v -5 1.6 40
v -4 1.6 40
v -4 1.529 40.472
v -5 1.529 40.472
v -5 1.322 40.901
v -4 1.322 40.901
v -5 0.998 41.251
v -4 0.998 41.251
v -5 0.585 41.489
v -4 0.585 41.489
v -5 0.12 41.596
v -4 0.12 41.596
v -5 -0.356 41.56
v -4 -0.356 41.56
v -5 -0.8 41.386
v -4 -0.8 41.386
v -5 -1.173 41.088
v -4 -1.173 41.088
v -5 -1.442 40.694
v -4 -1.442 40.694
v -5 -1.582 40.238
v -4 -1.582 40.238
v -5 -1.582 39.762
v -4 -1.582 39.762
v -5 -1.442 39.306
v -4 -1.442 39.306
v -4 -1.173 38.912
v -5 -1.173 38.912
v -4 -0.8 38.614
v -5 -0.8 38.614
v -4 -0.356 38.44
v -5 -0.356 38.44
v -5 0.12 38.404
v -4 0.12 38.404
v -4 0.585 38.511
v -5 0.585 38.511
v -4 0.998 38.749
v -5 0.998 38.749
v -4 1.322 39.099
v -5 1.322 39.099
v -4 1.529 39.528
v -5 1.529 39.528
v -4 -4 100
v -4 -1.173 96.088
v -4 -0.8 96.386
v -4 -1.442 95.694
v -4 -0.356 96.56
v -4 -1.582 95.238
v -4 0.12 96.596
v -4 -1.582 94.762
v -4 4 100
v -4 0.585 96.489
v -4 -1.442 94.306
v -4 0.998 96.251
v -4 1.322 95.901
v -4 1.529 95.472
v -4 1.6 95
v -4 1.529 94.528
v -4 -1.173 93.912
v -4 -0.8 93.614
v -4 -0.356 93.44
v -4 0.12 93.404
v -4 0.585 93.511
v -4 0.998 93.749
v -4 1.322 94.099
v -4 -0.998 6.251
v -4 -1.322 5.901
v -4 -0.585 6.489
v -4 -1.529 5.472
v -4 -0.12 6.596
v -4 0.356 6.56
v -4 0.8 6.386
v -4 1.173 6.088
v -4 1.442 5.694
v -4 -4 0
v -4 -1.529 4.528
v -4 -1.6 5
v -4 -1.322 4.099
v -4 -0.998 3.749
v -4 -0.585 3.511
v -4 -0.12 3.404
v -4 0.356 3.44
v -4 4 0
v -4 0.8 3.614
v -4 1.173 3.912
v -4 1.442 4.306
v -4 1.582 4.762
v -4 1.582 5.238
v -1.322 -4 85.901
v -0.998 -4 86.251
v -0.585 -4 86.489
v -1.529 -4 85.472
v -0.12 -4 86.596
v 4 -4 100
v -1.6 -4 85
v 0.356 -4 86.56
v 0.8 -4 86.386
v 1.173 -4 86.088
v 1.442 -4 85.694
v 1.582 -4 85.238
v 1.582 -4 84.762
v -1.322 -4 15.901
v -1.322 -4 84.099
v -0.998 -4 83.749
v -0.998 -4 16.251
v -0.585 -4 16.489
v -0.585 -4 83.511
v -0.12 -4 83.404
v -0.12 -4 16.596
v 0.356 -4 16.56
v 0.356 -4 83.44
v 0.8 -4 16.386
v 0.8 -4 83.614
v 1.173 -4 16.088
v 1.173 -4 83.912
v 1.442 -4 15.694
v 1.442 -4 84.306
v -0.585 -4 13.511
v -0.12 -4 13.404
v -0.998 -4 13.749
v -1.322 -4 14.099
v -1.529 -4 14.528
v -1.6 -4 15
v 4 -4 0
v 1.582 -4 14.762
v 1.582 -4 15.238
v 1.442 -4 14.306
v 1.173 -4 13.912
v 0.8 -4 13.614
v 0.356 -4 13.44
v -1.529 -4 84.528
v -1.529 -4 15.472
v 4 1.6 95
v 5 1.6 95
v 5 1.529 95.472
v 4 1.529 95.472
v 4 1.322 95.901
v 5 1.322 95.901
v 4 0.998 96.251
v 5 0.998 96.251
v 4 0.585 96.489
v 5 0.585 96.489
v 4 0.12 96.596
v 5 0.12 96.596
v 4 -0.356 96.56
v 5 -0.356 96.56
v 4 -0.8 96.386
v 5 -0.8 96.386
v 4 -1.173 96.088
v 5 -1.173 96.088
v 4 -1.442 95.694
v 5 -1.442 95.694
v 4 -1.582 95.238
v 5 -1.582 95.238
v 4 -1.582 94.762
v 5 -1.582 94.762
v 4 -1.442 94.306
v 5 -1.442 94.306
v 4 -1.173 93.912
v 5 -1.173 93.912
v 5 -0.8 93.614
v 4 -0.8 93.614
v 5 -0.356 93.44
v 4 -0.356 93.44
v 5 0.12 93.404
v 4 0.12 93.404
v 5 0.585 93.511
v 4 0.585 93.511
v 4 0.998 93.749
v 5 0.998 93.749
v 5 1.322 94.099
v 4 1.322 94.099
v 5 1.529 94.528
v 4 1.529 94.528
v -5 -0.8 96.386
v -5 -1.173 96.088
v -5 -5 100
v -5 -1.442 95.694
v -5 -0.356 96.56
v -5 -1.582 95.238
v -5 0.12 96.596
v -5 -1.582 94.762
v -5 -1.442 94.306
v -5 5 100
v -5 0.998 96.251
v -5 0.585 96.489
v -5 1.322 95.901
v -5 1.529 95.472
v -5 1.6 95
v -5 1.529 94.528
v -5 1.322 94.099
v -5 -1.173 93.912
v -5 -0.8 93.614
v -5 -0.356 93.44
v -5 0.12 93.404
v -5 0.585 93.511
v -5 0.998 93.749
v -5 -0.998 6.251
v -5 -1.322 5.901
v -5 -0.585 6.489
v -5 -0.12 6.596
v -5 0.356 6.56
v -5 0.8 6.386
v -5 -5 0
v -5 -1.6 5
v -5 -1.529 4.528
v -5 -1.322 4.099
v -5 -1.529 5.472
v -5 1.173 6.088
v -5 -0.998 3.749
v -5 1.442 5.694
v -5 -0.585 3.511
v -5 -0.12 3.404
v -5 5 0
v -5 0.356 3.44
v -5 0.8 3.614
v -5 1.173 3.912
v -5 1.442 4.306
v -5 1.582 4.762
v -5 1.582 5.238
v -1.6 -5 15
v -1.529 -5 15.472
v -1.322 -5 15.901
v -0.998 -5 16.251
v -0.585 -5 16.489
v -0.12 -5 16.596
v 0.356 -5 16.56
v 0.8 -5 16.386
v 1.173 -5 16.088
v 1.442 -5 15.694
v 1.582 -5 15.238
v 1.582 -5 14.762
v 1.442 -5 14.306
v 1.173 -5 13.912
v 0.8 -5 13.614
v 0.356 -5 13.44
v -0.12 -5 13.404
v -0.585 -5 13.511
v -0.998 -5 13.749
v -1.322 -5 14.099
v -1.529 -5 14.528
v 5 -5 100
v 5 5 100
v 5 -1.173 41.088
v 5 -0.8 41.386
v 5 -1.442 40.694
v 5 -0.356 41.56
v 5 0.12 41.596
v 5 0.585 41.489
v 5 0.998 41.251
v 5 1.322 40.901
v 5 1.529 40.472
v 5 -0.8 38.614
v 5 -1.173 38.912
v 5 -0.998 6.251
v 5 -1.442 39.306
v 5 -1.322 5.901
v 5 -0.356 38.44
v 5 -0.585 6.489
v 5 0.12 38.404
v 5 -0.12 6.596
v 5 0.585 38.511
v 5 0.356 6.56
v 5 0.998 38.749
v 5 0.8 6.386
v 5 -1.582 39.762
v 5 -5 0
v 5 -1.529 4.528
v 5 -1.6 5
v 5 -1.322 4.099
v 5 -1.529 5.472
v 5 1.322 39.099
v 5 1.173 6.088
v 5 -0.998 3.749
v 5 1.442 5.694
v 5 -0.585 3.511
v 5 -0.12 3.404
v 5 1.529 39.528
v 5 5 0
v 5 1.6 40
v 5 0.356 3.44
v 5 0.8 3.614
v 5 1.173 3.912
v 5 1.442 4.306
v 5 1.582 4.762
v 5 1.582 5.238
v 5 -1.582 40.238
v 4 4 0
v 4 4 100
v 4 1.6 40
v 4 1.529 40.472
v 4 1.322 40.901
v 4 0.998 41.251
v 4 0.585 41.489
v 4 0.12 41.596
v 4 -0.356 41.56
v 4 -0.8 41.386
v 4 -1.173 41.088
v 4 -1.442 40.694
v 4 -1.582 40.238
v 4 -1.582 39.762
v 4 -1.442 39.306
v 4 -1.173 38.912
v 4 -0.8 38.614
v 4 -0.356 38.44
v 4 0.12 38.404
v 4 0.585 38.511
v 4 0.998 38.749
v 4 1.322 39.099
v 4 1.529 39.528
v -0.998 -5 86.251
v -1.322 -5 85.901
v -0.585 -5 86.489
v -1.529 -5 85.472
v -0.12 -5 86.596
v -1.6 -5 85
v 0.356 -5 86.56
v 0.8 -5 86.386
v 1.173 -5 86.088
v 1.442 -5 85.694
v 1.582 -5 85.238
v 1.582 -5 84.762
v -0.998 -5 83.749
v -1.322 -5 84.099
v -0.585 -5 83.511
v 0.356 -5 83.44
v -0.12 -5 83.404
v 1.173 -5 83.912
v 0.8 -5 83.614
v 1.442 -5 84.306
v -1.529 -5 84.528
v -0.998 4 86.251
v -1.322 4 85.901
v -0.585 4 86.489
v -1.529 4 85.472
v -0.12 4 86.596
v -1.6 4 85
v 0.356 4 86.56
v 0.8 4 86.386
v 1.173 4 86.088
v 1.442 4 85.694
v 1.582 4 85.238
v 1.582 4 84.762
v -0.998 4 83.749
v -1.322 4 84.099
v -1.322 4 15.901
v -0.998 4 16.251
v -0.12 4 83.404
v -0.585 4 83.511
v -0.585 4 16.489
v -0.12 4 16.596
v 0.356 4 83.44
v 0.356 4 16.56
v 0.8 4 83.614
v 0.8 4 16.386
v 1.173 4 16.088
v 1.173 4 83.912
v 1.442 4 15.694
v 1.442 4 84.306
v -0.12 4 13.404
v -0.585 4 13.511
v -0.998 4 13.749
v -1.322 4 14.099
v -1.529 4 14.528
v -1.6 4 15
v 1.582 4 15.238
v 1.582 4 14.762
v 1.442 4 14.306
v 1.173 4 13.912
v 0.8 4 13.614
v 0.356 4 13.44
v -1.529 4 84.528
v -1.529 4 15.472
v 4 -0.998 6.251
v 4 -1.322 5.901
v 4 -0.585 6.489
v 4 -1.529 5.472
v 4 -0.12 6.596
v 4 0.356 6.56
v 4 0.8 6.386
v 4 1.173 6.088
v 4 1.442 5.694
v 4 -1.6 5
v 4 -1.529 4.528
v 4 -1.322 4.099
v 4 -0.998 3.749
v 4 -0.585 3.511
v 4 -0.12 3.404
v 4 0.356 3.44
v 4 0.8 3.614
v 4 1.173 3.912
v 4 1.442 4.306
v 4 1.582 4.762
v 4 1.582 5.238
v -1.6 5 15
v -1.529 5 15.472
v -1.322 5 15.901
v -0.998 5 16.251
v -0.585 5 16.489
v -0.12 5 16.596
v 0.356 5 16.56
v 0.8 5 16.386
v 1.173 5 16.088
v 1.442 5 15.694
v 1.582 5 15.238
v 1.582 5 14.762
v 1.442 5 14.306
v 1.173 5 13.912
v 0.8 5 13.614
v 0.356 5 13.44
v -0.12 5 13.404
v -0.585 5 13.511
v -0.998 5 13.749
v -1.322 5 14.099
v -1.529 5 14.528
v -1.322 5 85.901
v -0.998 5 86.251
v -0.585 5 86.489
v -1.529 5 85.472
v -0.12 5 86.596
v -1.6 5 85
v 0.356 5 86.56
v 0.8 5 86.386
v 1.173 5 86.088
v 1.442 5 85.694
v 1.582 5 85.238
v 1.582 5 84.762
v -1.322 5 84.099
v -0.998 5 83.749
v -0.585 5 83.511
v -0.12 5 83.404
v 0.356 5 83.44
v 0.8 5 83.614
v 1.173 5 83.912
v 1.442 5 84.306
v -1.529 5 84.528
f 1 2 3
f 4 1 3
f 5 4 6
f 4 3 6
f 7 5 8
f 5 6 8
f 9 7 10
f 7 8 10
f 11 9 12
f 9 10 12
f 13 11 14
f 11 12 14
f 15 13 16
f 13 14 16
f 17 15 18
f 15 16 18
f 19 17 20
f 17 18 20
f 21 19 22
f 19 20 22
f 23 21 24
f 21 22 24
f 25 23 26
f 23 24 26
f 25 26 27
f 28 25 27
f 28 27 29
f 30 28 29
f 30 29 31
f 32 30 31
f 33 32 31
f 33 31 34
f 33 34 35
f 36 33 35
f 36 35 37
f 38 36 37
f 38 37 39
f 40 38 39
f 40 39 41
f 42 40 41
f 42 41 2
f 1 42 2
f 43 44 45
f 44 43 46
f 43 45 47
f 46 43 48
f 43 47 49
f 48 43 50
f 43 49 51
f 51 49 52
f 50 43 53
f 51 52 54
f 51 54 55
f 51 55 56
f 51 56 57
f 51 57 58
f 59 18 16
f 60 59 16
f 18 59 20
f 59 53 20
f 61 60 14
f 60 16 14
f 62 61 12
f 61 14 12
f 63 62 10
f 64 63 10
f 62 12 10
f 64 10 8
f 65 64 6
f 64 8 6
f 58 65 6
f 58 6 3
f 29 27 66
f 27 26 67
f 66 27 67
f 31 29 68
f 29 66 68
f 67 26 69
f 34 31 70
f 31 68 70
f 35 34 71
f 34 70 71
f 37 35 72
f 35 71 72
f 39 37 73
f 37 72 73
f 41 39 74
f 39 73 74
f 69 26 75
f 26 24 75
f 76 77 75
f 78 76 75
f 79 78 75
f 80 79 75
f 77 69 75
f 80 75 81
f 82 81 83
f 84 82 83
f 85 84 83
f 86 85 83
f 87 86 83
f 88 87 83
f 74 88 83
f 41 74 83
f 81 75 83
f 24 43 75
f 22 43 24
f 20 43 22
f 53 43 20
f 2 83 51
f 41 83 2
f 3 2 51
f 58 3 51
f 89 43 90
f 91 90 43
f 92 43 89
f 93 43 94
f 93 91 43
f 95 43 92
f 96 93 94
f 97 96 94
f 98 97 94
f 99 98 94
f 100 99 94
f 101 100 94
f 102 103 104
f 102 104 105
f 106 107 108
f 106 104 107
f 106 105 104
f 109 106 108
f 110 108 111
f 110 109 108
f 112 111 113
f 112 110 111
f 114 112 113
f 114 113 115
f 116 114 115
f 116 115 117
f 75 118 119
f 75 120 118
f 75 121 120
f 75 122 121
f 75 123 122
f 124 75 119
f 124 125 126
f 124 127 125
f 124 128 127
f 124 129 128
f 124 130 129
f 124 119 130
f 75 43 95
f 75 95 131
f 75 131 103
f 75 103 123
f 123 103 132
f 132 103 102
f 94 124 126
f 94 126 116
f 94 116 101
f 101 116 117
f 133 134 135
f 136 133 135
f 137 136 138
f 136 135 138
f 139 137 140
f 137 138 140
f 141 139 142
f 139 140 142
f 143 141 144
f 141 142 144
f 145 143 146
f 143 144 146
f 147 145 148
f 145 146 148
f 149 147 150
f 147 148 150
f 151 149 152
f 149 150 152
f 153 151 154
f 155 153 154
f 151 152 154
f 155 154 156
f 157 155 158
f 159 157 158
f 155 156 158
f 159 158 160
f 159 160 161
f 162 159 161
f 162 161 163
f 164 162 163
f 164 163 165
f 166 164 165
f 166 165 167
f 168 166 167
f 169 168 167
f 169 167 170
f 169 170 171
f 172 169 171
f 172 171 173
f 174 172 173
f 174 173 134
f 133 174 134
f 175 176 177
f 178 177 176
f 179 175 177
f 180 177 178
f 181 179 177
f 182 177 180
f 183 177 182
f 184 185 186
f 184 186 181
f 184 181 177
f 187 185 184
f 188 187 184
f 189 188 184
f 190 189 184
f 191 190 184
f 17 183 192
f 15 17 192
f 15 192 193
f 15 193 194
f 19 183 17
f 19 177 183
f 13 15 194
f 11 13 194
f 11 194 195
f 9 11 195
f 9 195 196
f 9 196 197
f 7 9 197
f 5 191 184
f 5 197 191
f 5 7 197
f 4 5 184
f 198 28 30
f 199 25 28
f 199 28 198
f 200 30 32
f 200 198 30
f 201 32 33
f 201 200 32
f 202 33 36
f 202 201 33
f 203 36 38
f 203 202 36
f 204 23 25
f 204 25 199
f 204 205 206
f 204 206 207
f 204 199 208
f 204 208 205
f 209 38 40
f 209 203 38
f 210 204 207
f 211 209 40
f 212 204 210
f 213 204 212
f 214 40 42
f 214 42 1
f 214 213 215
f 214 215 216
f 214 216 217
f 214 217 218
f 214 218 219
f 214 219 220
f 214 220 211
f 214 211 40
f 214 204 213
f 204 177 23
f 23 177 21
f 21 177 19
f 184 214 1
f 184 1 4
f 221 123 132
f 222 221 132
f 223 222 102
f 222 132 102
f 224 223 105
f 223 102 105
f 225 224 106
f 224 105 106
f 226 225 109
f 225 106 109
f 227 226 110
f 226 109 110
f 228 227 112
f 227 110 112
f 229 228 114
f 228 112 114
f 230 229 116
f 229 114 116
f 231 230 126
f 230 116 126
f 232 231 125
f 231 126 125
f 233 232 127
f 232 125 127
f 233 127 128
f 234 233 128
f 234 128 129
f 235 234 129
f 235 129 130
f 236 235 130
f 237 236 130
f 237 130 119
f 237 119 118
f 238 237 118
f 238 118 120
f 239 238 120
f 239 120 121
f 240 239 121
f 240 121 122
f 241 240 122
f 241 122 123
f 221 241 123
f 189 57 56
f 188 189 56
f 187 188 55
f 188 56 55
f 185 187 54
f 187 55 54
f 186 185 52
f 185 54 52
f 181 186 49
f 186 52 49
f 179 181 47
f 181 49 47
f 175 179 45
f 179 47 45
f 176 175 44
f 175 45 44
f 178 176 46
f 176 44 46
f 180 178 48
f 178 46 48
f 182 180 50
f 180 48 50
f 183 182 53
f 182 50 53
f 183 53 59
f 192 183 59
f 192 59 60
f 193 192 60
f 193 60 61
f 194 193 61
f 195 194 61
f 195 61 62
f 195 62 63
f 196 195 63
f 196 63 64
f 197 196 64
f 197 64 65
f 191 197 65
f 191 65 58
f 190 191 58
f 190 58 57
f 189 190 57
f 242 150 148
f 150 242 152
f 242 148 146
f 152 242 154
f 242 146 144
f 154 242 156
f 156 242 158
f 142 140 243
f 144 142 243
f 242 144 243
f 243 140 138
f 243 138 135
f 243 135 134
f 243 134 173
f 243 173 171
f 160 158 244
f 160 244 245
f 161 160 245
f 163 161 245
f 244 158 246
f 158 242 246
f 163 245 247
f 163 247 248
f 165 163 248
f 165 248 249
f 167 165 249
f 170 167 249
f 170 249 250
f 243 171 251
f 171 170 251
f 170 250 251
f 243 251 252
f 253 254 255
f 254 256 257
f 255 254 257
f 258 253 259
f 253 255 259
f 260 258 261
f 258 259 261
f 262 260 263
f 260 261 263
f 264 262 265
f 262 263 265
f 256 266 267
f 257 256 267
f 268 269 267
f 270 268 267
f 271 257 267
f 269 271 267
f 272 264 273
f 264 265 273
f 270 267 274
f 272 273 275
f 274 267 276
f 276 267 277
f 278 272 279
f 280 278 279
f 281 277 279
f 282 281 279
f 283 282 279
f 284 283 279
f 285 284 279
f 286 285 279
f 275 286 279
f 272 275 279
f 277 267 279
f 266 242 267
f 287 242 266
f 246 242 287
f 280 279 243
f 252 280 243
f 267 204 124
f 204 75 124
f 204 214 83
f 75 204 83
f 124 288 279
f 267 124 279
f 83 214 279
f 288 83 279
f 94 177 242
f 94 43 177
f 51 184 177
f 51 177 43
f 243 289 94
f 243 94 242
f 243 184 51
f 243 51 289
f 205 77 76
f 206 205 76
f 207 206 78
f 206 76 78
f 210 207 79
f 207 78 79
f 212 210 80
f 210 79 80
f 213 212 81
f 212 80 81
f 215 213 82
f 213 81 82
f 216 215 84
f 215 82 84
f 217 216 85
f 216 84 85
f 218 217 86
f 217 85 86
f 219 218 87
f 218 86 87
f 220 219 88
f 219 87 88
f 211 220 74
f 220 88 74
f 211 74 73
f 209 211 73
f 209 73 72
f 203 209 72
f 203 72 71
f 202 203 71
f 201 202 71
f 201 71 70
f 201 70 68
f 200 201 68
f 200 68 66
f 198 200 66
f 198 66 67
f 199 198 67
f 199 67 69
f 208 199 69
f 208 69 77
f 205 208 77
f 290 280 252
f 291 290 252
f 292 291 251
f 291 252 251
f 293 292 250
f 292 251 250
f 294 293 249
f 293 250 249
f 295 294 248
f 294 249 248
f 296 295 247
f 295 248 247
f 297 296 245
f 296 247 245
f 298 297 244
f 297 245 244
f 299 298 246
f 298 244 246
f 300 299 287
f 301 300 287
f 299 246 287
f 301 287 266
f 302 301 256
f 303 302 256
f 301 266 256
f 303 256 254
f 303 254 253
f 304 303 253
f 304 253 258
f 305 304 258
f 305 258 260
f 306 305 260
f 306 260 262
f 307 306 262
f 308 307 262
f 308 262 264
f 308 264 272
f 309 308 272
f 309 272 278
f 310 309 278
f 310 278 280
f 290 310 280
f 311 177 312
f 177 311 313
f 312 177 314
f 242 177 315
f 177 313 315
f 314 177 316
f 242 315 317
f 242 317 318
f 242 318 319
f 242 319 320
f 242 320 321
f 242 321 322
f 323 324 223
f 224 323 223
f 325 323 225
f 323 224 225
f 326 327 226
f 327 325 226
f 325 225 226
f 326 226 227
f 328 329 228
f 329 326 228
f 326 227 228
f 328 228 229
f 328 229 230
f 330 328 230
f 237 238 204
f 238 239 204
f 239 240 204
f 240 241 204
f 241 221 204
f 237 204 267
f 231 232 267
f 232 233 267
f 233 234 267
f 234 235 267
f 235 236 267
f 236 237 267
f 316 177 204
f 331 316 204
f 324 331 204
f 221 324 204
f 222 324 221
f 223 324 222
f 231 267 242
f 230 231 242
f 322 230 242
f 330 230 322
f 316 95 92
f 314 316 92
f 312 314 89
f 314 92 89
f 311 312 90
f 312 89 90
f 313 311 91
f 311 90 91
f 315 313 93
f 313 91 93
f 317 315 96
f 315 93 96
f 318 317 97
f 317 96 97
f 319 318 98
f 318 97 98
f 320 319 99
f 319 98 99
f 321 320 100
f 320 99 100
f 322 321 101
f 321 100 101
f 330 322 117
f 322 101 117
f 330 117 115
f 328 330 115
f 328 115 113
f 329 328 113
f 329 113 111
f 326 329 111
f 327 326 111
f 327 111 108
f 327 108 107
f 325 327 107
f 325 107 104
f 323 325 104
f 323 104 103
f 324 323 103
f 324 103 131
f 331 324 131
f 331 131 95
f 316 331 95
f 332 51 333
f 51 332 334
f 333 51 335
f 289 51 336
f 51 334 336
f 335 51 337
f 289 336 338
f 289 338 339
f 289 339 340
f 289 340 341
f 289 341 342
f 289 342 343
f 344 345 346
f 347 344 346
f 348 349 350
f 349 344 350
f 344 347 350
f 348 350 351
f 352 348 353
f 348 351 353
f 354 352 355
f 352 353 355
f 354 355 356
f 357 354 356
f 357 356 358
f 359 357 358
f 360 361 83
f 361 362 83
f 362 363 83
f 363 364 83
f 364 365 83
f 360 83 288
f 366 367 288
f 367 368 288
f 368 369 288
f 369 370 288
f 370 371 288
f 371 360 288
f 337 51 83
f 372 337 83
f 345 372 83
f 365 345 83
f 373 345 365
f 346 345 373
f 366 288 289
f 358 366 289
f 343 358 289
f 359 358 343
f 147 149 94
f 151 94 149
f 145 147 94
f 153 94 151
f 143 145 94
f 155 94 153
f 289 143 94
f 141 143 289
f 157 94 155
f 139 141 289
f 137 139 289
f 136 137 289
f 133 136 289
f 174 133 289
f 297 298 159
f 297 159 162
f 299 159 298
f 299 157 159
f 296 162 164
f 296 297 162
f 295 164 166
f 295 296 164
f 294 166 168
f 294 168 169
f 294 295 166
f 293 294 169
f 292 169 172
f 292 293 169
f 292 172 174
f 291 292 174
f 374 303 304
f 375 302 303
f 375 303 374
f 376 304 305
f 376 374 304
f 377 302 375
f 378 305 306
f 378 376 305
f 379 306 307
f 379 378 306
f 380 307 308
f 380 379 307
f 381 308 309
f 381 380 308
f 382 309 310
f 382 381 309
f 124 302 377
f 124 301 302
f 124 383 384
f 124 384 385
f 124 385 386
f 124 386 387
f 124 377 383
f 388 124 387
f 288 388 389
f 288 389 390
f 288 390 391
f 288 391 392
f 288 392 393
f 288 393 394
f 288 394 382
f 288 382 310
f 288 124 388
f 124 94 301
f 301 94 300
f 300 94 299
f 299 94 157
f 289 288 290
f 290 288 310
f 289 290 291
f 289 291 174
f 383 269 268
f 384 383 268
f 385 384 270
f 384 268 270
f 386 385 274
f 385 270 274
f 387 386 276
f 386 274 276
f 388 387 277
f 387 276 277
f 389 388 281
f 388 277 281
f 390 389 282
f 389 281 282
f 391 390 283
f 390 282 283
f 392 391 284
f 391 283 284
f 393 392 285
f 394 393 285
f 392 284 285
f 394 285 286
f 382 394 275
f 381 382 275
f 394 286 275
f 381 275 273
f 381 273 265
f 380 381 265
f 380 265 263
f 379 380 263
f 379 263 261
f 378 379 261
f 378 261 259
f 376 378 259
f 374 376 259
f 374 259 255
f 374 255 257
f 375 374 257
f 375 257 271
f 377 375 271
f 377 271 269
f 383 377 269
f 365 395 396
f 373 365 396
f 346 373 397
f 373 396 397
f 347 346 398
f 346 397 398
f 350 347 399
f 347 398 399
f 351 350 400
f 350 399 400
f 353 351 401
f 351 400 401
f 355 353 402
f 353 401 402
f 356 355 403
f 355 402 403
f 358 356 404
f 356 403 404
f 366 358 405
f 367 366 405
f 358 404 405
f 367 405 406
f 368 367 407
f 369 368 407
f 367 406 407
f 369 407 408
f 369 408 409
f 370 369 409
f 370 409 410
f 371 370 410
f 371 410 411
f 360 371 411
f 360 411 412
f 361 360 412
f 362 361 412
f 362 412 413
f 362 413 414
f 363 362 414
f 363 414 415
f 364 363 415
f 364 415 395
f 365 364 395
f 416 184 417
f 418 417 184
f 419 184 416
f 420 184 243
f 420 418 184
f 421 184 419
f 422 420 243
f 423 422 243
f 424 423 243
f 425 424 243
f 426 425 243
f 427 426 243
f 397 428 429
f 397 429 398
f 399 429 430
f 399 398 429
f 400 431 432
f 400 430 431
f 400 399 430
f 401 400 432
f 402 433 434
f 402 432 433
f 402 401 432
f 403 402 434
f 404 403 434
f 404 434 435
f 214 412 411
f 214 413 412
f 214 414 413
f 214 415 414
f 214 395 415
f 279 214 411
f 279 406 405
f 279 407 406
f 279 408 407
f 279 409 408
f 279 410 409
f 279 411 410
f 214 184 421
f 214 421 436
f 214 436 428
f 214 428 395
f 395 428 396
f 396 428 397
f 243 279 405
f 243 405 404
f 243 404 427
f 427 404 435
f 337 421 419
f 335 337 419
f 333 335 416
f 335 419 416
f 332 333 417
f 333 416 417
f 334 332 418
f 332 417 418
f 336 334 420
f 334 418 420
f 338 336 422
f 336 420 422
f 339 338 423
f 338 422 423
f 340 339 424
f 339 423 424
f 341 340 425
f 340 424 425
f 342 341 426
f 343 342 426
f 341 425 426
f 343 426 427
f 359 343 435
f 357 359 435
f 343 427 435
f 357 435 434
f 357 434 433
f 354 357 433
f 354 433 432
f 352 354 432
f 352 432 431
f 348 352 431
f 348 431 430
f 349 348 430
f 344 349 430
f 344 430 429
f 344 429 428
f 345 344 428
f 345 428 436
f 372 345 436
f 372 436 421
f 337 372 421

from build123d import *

# Parameters (mm, degrees)
SKETCH_2_W          = 10
SKETCH_2_H          = 10
SKETCH_2_W_2        = 8
SKETCH_2_H_2        = 8
EXTRUDE_1_DEPTH     = 100
SKETCH_3_R          = 1.6
CUT_EXTRUDE_1_DEPTH = 101.623058987
SKETCH_4_R          = 1.6
CUT_EXTRUDE_2_DEPTH = 101.623058987
SKETCH_7_R          = 1.6
CUT_EXTRUDE_4_DEPTH = 101.623058987


with BuildPart() as part:
    # ｽｹｯﾁ2 → 押し出し-薄板1 (new body)
    with BuildSketch(Plane.XY):
        Rectangle(SKETCH_2_W, SKETCH_2_H)
        Rectangle(SKETCH_2_W_2, SKETCH_2_H_2, mode=Mode.SUBTRACT)
    extrude(amount=EXTRUDE_1_DEPTH)

    # ｽｹｯﾁ3 → ｶｯﾄ - 押し出し1 (cut, through all)
    with BuildSketch(Plane(origin=(5, 0, 0), x_dir=(0, 0, -1), z_dir=(1, 0, 0))):
        with Locations(Location((-95, 0, 0), (0, 0, 90))):
            Circle(SKETCH_3_R)
        with Locations(Location((-5, 0, 0), (0, 0, 270))):
            Circle(SKETCH_3_R)
        with Locations(Location((-40, 0, 0), (0, 0, 90))):
            Circle(SKETCH_3_R)
    extrude(amount=-CUT_EXTRUDE_1_DEPTH, mode=Mode.SUBTRACT)

    # ｽｹｯﾁ4 → ｶｯﾄ - 押し出し2 (cut, through all)
    with BuildSketch(Plane(origin=(0, 5, 0), x_dir=(1, 0, 0), z_dir=(0, 1, 0))):
        with Locations(Location((0, -15, 0), (0, 0, 180))):
            Circle(SKETCH_4_R)
    extrude(amount=-CUT_EXTRUDE_2_DEPTH, mode=Mode.SUBTRACT)

    # ｽｹｯﾁ7 → ｶｯﾄ - 押し出し4 (cut, through all)
    with BuildSketch(Plane(origin=(0, 5, 0), x_dir=(1, 0, 0), z_dir=(0, 1, 0))):
        with Locations(Location((0, -85, 0), (0, 0, 180))):
            Circle(SKETCH_7_R)
    extrude(amount=-CUT_EXTRUDE_4_DEPTH, mode=Mode.SUBTRACT)


solid = part.part
